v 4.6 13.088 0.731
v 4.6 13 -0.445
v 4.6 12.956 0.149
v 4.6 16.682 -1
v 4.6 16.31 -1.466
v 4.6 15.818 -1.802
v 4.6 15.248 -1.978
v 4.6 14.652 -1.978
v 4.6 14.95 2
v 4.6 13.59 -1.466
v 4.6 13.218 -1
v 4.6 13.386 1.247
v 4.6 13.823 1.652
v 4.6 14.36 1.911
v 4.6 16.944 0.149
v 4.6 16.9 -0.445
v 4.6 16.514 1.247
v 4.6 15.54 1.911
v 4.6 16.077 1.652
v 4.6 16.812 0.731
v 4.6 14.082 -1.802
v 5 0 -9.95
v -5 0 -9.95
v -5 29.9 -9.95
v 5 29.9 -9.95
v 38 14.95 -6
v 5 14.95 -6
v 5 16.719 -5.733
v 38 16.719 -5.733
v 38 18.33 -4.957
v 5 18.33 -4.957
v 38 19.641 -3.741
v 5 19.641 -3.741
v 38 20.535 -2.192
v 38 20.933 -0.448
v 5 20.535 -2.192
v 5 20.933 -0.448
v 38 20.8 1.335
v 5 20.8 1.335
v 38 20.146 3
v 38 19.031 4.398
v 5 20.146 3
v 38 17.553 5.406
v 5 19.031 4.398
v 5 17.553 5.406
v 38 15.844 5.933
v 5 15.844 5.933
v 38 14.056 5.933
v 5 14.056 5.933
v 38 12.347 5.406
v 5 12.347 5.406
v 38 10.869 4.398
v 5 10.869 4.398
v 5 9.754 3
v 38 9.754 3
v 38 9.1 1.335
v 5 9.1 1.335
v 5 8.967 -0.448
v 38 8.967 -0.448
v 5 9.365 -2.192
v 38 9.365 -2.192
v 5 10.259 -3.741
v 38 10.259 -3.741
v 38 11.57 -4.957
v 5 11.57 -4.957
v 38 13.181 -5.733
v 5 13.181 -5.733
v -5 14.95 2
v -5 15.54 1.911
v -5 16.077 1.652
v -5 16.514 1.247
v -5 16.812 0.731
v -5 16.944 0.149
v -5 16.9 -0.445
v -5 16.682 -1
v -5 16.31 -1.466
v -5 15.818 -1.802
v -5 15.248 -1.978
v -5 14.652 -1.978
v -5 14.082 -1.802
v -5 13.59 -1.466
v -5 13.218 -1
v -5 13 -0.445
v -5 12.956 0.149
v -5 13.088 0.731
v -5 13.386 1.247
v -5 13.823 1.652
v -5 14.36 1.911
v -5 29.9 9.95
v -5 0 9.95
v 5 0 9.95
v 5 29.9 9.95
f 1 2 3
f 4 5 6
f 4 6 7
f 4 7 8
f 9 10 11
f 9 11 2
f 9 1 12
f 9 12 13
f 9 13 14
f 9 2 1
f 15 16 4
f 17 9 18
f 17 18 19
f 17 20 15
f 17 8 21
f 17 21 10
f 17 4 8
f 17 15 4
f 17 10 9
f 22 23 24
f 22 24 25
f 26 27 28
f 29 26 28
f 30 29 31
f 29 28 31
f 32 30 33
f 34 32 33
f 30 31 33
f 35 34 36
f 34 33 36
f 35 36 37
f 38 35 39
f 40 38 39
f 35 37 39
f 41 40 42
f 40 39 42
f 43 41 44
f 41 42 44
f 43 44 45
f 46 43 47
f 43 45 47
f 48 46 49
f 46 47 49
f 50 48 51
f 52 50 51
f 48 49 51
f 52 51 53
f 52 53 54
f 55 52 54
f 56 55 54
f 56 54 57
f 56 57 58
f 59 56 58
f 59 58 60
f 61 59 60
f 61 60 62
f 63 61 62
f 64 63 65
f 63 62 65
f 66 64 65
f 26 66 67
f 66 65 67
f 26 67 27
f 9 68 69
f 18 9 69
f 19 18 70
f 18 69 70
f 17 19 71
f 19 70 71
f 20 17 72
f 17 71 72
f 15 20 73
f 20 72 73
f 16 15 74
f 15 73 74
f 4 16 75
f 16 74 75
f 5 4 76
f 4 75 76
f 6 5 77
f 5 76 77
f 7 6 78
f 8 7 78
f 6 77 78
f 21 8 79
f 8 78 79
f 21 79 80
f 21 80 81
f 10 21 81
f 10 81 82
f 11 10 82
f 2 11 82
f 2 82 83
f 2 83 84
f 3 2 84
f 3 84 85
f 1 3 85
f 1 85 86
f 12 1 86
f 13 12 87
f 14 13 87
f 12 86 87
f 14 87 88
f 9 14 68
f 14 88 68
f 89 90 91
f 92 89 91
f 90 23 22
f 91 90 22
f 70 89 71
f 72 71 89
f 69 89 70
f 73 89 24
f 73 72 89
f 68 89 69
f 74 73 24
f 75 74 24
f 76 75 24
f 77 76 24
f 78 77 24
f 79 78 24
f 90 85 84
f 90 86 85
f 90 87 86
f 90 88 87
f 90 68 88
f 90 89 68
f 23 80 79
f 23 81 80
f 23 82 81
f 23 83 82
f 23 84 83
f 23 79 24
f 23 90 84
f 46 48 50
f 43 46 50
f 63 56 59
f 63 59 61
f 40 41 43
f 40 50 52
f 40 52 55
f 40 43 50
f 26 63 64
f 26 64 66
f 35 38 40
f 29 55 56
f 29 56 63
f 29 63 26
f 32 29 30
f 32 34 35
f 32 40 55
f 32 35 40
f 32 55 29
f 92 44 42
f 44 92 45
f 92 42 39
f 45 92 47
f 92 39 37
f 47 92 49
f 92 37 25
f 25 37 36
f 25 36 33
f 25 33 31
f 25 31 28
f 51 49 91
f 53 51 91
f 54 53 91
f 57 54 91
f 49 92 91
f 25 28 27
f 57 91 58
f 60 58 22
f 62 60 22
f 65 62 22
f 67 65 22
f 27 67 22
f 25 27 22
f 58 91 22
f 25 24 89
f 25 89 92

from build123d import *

# Parameters (mm, degrees)
SKETCH_1_W          = 10
SKETCH_1_H          = 19.9
EXTRUDE_1_DEPTH     = 29.9
SKETCH_4_R          = 6
EXTRUDE_2_DEPTH     = 33
SKETCH_7_R          = 2
CUT_EXTRUDE_1_DEPTH = 9.6


with BuildPart() as part:
    # Эскиз1 → Бобышка-Вытянуть1 (new body)
    with BuildSketch(Plane(origin=(0, 0, 0), x_dir=(1, 0, 0), z_dir=(0, 1, 0))):
        Rectangle(SKETCH_1_W, SKETCH_1_H)
    extrude(amount=EXTRUDE_1_DEPTH)

    # Эскиз4 → Бобышка-Вытянуть2 (add)
    with BuildSketch(Plane(origin=(5, 0, 0), x_dir=(0, 0, -1), z_dir=(1, 0, 0))):
        with Locations((0, 14.95)):
            Circle(SKETCH_4_R)
    extrude(amount=EXTRUDE_2_DEPTH)

    # Эскиз7 → Вырез-Вытянуть1 (cut)
    with BuildSketch(Plane.ZY.offset(5)):
        with Locations((0, 14.95)):
            Circle(SKETCH_7_R)
    extrude(amount=-CUT_EXTRUDE_1_DEPTH, mode=Mode.SUBTRACT)


solid = part.part
